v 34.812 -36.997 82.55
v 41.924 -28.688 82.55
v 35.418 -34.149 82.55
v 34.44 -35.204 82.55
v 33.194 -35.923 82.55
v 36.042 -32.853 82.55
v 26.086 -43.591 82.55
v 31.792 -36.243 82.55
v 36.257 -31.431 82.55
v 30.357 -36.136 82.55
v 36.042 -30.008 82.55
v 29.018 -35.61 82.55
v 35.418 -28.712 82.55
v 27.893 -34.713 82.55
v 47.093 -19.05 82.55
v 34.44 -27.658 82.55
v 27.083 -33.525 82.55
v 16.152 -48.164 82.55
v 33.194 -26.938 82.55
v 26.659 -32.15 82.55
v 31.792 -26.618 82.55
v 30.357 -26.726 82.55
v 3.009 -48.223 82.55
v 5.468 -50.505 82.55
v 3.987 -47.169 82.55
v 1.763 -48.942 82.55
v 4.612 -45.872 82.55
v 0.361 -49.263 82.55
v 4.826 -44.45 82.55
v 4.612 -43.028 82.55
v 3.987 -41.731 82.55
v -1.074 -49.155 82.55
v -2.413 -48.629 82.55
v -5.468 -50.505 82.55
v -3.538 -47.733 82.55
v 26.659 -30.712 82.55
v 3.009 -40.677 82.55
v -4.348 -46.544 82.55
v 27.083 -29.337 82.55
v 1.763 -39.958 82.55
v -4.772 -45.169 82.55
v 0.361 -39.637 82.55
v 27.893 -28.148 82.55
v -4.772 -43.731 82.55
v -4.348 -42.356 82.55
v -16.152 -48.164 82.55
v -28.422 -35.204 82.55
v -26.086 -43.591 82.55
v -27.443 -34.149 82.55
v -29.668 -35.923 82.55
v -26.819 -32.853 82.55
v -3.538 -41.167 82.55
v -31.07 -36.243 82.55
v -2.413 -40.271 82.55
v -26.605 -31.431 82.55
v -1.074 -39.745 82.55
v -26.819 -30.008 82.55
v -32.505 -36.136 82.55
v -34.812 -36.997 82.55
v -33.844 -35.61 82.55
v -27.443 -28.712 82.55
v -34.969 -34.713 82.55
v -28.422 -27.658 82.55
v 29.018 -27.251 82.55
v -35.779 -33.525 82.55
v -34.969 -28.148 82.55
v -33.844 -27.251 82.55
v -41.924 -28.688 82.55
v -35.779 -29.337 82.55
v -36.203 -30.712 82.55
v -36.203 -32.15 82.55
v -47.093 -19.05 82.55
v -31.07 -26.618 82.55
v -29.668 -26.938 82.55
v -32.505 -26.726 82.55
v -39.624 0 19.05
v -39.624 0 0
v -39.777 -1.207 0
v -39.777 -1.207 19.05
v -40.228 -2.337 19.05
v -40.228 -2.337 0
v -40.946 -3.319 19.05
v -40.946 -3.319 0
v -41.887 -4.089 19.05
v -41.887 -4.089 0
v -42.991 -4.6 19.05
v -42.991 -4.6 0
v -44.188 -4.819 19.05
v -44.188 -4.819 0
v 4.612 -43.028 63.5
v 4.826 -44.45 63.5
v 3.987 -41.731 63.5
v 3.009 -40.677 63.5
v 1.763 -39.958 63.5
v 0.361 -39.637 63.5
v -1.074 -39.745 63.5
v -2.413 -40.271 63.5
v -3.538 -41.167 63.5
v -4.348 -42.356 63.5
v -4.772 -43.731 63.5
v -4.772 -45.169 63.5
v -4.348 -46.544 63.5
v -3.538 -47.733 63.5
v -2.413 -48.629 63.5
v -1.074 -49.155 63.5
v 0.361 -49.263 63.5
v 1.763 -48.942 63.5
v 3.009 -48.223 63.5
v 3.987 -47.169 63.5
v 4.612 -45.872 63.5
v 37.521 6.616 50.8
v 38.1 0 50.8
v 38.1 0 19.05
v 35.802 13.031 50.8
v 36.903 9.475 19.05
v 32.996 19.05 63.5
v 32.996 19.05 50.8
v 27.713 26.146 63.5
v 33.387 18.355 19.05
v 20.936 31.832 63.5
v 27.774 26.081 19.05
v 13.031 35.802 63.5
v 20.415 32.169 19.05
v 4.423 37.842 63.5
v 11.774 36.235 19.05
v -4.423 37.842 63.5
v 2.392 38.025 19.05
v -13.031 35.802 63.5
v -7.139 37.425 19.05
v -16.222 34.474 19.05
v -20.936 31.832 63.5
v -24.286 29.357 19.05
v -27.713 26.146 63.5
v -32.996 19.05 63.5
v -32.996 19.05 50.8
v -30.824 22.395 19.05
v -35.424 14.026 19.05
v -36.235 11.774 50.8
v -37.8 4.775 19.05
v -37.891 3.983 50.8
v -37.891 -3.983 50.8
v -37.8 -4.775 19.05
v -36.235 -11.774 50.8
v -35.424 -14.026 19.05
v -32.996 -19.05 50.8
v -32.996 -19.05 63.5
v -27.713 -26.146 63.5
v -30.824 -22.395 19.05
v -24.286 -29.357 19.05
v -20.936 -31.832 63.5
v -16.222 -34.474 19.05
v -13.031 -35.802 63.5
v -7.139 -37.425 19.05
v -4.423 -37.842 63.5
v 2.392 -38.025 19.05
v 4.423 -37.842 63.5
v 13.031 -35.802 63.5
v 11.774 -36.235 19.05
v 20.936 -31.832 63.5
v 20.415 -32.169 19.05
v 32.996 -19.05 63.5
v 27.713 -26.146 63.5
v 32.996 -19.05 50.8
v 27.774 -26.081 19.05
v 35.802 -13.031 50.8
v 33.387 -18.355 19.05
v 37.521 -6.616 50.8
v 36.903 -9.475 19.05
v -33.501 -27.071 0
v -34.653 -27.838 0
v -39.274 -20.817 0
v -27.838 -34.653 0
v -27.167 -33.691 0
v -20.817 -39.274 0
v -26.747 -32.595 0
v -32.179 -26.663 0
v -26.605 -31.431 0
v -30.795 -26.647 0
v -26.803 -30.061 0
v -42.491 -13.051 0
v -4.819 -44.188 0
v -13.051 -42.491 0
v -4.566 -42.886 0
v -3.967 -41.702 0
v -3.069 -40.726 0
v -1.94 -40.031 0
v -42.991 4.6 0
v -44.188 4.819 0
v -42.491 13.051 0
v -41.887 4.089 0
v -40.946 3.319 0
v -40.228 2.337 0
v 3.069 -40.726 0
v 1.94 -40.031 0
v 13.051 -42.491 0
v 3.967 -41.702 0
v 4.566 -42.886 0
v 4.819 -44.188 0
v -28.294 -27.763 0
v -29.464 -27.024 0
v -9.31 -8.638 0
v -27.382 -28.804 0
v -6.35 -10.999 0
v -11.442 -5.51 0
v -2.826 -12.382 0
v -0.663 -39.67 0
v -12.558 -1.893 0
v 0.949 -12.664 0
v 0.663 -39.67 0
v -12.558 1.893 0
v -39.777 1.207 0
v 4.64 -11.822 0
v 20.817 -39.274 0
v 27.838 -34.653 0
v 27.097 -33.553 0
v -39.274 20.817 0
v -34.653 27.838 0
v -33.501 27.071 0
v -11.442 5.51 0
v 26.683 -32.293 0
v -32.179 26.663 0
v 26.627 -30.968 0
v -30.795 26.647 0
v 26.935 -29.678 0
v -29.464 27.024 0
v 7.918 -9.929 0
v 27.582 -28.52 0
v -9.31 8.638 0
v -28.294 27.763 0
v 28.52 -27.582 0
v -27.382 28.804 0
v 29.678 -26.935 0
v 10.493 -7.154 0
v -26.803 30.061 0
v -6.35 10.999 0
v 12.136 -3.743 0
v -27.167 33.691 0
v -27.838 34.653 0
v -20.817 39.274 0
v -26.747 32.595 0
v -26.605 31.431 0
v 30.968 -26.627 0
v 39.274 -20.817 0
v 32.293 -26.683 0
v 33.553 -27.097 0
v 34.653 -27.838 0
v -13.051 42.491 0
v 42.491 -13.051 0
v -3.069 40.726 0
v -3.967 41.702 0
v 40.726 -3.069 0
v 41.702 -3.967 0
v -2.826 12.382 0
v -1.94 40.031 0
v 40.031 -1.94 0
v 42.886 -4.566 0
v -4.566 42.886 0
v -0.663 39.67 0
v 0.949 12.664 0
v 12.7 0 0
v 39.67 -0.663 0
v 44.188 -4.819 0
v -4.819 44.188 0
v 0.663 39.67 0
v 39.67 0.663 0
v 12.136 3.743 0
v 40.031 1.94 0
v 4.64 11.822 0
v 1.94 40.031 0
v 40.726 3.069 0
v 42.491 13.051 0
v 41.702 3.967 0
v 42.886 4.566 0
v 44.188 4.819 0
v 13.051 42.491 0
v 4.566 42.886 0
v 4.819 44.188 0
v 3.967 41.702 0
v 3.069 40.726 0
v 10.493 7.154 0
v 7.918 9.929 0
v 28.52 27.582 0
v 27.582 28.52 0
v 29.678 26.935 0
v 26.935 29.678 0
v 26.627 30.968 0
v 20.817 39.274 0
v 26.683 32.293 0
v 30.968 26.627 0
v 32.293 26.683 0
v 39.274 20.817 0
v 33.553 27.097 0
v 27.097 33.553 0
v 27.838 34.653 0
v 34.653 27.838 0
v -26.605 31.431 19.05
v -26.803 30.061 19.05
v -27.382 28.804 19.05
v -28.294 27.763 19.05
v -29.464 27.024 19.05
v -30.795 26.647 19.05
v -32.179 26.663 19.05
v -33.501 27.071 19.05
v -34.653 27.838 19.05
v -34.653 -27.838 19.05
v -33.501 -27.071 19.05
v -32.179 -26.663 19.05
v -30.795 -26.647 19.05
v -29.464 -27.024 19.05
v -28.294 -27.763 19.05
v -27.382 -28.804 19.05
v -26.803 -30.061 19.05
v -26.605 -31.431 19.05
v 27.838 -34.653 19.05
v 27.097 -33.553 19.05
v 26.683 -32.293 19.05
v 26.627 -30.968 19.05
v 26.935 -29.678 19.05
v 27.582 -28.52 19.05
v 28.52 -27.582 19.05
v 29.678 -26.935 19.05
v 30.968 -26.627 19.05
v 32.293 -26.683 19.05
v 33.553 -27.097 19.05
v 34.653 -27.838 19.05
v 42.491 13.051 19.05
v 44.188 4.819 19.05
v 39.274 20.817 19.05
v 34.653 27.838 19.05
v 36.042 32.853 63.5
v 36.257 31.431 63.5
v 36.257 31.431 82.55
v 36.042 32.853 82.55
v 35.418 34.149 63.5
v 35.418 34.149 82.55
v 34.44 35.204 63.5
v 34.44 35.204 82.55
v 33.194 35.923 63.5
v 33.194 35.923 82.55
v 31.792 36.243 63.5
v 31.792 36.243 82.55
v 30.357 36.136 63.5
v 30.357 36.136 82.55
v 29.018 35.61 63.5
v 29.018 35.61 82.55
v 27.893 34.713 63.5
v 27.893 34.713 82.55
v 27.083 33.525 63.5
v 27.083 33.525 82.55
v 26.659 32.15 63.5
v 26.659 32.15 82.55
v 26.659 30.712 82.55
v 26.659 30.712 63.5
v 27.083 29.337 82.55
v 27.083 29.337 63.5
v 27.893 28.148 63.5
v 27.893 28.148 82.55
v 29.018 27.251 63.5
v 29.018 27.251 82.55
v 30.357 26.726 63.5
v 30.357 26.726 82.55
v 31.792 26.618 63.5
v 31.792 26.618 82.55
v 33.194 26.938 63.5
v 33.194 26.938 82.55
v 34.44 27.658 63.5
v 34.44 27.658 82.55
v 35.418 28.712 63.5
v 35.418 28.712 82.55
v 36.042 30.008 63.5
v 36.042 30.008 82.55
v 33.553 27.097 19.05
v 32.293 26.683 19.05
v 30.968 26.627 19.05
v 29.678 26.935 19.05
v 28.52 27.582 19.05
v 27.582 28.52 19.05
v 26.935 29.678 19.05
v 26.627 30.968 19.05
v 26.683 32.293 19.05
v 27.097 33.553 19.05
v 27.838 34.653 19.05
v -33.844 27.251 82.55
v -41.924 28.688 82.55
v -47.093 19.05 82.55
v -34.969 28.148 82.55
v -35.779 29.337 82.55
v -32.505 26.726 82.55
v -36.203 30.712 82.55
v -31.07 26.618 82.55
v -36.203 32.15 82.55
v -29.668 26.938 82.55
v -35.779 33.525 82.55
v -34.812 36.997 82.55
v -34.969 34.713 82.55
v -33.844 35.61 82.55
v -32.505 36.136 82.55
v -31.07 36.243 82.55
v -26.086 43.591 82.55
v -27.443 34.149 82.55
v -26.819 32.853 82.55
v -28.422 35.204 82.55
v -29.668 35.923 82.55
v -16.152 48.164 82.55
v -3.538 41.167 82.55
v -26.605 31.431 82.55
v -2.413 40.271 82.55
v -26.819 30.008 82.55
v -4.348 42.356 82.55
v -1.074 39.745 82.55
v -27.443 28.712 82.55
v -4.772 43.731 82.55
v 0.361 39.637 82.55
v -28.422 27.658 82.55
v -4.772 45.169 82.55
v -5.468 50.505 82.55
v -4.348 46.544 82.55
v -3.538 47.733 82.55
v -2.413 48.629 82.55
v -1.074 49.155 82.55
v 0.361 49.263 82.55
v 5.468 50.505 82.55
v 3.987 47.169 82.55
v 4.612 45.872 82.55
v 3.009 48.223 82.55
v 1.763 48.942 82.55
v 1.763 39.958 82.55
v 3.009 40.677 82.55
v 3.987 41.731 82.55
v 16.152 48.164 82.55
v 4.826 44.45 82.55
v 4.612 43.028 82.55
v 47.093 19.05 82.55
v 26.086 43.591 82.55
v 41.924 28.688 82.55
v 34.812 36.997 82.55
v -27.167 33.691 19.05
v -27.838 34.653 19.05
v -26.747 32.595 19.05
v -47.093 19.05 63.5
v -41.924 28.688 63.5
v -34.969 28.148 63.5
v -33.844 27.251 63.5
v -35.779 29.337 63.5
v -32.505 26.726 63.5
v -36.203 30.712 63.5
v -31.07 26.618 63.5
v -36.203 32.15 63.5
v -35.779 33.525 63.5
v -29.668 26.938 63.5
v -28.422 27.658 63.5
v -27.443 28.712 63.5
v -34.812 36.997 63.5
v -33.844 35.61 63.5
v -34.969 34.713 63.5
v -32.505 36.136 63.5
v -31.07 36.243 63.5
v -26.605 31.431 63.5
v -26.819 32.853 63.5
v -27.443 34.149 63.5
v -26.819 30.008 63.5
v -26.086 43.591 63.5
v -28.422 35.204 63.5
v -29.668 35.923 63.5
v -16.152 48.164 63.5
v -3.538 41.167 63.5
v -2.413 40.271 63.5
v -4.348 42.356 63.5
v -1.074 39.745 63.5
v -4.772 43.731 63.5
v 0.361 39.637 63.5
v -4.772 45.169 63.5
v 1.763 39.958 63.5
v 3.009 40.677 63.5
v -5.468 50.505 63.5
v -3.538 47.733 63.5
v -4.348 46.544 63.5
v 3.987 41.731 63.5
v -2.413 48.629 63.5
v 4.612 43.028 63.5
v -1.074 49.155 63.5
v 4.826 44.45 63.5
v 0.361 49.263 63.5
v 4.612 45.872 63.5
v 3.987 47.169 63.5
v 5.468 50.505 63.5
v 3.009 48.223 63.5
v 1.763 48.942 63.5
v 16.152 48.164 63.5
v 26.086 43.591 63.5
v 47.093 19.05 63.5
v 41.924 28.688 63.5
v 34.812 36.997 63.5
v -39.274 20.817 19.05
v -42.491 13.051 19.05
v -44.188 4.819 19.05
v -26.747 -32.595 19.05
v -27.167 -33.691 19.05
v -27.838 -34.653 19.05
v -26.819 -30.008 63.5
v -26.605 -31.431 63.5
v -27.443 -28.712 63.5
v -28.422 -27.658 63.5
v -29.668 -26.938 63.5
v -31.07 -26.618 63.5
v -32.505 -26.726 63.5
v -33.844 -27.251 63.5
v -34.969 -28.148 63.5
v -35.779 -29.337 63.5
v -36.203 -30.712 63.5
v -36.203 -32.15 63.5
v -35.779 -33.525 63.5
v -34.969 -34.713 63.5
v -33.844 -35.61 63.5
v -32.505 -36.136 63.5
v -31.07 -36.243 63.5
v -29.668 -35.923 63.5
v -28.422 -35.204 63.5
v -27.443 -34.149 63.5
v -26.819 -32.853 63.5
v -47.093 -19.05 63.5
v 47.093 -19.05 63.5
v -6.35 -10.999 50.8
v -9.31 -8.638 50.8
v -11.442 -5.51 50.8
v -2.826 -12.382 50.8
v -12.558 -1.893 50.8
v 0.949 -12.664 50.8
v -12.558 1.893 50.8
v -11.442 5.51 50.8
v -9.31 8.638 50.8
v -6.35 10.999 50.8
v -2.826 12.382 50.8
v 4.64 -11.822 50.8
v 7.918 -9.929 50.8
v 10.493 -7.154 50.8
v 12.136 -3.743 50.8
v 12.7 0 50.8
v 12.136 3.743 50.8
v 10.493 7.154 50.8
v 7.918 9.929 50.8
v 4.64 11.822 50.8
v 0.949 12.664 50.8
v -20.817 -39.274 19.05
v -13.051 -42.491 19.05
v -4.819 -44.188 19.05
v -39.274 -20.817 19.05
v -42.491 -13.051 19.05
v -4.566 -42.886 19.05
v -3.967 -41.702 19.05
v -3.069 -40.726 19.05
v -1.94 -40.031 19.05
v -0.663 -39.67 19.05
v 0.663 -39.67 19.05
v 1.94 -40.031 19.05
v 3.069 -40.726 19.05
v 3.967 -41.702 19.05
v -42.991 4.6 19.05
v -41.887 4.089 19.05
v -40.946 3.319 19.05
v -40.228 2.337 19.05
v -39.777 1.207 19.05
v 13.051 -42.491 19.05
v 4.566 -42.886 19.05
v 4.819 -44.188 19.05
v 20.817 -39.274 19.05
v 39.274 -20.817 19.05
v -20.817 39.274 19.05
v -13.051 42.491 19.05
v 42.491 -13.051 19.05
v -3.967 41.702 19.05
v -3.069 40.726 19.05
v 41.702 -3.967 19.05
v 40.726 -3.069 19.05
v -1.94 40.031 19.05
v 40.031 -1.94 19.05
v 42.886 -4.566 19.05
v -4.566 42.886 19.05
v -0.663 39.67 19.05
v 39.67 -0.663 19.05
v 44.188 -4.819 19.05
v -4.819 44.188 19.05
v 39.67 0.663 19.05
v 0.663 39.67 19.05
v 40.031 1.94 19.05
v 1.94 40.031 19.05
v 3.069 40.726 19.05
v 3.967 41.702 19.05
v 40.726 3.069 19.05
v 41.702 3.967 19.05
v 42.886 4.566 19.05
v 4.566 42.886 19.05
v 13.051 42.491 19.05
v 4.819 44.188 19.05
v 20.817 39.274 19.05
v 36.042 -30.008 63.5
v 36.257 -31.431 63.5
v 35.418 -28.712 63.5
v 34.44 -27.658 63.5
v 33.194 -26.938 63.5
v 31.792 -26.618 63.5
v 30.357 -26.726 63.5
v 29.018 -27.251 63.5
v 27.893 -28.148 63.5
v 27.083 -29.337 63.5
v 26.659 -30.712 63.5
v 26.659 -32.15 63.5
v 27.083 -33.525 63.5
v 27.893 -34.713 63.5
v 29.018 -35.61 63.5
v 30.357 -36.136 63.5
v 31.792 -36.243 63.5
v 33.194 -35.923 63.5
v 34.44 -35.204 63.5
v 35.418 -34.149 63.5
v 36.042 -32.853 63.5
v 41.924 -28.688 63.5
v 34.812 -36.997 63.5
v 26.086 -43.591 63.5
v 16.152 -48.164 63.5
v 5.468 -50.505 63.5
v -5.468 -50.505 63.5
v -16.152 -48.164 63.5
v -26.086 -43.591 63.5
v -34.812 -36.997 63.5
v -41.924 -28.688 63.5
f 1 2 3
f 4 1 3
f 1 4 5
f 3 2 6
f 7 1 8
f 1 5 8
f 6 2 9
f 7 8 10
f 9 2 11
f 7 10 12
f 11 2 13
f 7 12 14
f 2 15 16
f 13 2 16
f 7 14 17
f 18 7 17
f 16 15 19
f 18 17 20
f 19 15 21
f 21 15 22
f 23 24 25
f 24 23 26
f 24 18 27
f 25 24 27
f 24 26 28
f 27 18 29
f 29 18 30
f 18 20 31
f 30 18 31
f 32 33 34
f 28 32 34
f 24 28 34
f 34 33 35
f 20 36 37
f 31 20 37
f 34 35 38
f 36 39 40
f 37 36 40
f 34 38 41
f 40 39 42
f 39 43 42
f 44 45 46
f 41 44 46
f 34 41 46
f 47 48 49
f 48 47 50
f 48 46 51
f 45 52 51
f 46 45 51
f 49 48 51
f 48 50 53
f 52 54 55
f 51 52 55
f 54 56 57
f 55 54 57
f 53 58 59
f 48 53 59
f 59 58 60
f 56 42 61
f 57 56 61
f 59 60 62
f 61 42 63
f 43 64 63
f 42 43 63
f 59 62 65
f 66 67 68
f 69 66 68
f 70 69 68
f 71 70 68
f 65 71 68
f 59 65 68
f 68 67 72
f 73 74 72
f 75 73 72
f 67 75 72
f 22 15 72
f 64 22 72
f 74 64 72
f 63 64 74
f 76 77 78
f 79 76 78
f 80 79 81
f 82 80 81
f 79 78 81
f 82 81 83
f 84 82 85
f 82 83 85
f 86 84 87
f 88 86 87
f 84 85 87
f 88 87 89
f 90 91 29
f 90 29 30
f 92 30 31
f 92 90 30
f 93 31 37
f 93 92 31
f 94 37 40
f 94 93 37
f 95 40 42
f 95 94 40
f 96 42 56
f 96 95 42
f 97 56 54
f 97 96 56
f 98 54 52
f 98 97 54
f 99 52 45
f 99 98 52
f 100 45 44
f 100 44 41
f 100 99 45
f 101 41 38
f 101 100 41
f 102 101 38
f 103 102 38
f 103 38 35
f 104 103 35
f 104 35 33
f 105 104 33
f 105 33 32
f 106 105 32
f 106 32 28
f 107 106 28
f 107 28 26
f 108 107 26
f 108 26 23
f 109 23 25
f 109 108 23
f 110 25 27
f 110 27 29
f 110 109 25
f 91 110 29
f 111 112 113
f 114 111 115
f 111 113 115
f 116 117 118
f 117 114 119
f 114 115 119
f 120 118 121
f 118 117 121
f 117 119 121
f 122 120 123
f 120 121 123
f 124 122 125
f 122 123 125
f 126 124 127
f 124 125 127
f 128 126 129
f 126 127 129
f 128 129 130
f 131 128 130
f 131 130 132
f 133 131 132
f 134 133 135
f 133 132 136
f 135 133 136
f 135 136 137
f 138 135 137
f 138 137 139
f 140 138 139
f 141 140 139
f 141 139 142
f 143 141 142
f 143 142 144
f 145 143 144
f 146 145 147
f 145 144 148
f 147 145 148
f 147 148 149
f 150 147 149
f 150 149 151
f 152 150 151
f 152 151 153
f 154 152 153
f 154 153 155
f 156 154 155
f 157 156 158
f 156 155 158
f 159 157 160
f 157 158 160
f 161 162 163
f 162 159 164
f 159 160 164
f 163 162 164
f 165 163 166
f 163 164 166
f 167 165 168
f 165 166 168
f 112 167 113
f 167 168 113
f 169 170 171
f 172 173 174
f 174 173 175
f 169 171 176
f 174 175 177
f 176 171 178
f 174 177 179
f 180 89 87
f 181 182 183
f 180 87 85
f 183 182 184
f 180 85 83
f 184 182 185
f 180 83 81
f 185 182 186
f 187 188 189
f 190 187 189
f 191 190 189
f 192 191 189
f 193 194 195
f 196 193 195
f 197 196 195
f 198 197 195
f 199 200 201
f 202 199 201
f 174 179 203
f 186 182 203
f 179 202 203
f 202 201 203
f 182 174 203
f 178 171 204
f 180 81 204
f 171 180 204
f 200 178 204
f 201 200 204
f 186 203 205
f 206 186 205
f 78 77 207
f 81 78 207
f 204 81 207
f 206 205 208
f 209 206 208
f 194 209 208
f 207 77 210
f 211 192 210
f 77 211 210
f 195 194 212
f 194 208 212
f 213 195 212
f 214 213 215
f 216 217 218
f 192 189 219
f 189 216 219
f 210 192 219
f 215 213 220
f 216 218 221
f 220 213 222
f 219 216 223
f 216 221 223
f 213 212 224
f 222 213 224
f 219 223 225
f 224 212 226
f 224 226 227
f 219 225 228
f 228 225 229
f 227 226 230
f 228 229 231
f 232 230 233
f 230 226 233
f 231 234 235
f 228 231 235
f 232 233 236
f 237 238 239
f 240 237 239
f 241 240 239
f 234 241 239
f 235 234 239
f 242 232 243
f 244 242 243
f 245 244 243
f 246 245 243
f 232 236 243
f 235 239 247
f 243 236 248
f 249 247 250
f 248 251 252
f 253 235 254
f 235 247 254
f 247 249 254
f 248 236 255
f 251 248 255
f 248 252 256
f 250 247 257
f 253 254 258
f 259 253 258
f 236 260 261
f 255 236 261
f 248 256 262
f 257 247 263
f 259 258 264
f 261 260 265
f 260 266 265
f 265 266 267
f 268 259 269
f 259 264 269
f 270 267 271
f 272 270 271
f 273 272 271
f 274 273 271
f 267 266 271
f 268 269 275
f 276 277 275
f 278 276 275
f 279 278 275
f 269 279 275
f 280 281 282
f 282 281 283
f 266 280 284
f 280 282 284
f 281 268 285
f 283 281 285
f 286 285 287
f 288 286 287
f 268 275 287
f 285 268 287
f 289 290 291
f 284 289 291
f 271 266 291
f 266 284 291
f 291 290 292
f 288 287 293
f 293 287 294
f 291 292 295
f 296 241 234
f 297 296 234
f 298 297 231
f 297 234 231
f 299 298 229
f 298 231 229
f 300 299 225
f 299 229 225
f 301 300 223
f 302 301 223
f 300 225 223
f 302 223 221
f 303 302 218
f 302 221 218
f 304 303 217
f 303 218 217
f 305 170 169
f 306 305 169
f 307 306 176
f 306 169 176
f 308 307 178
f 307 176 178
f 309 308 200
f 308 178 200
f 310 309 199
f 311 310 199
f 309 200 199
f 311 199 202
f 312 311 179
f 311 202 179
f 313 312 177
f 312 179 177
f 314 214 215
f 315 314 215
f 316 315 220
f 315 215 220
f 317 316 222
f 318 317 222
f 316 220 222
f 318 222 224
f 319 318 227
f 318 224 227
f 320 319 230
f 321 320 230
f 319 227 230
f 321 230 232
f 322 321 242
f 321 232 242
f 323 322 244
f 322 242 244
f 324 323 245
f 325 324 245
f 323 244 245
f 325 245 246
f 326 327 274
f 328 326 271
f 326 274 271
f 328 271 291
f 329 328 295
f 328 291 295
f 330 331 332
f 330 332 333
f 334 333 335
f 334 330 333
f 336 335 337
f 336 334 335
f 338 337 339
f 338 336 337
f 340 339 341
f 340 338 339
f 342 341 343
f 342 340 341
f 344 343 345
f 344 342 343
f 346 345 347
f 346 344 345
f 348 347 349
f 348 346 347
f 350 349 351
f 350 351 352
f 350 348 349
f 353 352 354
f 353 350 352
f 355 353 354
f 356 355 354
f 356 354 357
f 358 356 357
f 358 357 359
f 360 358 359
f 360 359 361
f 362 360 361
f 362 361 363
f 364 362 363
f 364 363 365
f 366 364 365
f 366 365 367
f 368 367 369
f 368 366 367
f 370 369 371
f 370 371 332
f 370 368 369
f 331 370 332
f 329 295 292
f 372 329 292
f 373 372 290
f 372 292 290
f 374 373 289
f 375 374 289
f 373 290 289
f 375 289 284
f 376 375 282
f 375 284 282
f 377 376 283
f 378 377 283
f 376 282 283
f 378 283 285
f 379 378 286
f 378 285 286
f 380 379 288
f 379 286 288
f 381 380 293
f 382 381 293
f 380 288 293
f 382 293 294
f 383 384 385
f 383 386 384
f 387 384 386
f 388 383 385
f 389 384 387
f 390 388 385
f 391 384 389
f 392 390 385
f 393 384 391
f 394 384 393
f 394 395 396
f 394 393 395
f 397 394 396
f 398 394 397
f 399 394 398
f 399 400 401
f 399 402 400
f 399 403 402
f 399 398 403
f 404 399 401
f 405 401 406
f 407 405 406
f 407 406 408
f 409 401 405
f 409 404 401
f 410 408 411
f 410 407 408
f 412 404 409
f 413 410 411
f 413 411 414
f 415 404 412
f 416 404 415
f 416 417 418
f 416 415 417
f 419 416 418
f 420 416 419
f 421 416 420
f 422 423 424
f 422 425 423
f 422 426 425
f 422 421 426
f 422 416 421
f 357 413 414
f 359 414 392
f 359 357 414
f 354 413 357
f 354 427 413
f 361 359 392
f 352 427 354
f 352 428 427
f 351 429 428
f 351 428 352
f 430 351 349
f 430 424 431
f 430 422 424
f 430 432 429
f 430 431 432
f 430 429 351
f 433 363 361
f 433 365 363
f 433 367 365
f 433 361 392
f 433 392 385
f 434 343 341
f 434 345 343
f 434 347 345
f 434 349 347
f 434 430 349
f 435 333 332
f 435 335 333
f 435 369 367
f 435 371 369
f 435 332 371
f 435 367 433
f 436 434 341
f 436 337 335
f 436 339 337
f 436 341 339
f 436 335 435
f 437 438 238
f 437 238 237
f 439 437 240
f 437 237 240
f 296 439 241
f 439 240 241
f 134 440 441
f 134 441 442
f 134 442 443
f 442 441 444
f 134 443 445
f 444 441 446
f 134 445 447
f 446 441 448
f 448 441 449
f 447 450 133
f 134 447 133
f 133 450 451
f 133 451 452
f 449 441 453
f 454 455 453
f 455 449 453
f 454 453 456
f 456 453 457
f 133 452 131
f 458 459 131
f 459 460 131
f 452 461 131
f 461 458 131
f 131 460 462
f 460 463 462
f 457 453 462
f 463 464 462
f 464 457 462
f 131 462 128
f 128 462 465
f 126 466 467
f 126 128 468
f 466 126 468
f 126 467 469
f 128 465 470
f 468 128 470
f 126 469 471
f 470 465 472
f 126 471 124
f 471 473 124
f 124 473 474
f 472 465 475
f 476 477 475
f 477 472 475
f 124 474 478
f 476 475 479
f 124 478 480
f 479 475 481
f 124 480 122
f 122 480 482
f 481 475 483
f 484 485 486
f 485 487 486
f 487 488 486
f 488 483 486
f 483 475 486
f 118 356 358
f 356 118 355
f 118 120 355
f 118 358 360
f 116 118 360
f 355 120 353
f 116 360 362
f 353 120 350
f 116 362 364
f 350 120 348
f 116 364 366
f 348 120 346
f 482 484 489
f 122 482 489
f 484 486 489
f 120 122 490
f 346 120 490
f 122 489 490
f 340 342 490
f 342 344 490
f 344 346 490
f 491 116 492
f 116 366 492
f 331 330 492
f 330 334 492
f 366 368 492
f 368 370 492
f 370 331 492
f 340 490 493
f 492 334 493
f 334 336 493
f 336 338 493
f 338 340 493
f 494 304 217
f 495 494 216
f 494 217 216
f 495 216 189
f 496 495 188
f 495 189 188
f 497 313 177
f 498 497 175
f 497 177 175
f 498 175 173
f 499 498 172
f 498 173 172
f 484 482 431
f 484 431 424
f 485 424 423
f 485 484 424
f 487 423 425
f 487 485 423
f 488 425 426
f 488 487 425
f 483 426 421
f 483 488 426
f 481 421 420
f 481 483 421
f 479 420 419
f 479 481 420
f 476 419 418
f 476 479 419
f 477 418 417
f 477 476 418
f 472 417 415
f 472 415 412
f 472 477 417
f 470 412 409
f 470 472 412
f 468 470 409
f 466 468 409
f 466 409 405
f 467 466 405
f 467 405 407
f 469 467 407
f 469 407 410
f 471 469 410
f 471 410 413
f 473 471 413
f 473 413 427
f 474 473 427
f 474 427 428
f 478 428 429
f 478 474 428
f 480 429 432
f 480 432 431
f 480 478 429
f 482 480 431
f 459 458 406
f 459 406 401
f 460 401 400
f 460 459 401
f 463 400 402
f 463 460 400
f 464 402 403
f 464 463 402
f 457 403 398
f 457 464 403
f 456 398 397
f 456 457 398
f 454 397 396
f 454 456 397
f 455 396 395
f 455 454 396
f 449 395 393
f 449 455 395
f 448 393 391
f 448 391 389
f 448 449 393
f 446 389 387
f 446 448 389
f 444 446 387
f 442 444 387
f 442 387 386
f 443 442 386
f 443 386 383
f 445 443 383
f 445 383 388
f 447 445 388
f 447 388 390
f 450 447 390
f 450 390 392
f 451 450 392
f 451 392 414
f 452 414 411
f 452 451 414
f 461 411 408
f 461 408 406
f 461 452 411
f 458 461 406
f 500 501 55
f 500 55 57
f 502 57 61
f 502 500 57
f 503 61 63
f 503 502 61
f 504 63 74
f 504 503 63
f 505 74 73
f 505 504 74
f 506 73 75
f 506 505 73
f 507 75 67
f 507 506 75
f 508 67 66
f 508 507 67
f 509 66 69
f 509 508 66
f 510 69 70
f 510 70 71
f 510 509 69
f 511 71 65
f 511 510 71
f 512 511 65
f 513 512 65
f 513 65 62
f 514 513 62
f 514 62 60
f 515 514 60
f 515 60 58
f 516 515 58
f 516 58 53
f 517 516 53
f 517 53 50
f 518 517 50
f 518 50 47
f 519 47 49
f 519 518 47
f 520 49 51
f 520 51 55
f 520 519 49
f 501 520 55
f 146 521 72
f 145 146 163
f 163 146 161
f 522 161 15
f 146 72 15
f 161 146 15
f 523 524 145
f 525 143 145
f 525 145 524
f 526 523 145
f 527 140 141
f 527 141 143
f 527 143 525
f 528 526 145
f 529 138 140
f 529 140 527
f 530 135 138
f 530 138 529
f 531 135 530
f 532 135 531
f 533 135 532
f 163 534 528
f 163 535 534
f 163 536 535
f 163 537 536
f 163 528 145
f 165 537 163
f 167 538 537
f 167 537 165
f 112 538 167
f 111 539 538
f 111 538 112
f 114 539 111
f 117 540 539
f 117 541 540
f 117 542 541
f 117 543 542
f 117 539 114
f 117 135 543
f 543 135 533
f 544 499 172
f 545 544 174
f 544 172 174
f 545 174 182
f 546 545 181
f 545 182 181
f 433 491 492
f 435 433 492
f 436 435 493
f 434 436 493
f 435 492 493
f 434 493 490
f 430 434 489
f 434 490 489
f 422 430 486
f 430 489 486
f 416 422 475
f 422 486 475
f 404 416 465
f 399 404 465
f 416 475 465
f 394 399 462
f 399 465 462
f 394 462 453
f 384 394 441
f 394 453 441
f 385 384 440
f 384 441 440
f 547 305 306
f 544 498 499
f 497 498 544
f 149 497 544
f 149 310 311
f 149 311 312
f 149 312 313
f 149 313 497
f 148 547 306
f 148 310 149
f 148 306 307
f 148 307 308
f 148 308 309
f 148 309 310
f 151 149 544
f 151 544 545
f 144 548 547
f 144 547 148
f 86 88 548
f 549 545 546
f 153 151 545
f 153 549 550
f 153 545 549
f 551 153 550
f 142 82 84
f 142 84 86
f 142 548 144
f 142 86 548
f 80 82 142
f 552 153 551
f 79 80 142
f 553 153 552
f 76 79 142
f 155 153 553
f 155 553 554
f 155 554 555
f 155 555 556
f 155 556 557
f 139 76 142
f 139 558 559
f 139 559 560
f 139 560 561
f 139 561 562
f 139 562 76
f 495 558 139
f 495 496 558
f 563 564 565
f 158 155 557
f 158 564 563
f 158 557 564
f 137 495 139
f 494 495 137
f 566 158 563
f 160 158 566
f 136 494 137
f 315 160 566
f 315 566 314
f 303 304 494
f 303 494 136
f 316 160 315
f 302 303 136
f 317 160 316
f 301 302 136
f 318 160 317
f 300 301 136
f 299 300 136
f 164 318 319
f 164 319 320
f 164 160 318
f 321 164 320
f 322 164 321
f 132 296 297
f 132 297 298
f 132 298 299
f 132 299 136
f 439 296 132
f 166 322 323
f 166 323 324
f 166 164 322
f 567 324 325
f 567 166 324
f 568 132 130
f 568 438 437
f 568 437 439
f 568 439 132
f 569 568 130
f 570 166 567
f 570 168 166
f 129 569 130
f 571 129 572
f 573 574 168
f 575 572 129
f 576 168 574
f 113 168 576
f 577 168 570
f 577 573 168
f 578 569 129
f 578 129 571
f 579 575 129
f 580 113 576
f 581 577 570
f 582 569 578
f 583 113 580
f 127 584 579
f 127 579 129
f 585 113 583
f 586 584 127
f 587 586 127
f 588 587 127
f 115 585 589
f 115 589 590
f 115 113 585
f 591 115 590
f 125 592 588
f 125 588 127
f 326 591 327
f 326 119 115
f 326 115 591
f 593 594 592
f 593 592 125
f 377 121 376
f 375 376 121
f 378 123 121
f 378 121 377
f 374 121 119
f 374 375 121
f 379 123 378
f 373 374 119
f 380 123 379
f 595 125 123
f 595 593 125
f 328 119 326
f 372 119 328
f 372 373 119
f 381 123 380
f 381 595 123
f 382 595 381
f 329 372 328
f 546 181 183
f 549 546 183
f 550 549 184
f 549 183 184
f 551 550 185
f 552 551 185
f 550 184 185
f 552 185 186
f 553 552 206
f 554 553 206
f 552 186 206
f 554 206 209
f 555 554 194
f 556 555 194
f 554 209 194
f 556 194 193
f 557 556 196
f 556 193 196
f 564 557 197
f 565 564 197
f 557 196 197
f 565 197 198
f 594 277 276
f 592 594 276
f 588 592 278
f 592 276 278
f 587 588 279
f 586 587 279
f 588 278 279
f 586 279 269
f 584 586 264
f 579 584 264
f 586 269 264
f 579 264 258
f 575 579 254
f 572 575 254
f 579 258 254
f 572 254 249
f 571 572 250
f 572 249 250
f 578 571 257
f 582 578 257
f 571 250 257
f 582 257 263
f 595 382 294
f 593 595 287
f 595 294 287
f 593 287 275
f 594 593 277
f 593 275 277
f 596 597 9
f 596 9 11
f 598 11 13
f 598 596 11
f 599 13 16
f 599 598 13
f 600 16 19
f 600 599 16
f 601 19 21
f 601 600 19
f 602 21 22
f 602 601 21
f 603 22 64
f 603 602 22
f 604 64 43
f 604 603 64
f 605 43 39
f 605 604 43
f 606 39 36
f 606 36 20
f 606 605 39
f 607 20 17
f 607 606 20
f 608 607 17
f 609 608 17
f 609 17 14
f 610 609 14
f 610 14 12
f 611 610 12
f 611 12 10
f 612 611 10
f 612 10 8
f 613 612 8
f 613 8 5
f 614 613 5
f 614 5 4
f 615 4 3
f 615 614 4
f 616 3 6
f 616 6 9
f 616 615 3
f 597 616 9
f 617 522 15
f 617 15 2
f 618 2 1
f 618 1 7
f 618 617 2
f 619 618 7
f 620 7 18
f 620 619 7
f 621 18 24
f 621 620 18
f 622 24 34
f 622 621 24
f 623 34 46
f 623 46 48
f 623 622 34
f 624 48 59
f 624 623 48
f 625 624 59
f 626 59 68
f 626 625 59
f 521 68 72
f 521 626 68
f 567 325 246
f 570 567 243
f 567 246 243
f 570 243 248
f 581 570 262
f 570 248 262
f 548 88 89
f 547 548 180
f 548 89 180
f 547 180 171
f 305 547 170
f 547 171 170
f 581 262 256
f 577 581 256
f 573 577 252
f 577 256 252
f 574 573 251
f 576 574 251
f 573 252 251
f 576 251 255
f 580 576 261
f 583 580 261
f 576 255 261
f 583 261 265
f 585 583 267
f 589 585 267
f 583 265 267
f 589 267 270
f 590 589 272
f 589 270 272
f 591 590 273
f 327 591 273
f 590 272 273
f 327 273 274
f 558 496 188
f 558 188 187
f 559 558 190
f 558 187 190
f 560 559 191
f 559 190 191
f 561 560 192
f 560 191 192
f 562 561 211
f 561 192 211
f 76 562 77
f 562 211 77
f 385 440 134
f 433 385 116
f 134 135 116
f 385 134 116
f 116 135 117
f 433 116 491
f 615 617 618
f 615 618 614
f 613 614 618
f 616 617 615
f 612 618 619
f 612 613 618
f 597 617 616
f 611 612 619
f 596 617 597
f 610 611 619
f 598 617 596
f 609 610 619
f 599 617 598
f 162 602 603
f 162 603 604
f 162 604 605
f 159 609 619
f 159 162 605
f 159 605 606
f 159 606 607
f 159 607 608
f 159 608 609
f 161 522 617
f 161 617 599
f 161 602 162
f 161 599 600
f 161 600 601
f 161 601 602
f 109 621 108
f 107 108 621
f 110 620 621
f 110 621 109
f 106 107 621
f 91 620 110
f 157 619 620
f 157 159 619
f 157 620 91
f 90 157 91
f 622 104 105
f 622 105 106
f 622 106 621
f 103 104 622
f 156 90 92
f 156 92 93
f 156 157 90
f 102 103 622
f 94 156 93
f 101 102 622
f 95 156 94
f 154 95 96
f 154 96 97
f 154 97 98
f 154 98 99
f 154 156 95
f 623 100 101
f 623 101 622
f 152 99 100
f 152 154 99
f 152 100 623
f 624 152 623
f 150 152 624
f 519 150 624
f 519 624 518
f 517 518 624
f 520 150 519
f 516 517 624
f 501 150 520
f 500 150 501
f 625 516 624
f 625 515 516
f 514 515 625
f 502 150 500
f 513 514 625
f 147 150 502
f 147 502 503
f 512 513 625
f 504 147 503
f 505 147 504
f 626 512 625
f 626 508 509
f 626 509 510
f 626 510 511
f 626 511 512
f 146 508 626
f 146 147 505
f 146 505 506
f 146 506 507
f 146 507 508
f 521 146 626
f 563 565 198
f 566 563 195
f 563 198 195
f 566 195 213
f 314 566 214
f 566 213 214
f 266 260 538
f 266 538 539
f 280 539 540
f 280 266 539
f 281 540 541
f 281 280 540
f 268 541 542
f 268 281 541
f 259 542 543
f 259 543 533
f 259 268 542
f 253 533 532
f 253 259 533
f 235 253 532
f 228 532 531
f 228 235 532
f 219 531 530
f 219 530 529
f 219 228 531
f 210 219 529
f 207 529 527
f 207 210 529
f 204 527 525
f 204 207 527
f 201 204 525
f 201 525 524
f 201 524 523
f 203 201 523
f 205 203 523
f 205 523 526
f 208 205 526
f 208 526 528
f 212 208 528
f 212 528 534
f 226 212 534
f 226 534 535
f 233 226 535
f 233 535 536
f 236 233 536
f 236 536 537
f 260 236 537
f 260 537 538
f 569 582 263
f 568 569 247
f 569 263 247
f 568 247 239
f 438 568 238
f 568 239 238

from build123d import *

# Parameters (mm, degrees)
SKETCH1_R           = 38.1
SKETCH1_R_2         = 12.7
BOSS_EXTRUDE1_DEPTH = 63.5
SKETCH1_3_R         = 38.1
BOSS_EXTRUDE2_DEPTH = 19.05
SKETCH2_R           = 4.826
BOSS_EXTRUDE3_DEPTH = 19.05
CUT_EXTRUDE1_START  = -12.7
SKETCH2_3_R         = 12.7
CUT_EXTRUDE1_DEPTH  = 12.7


with BuildPart() as part:
    # Sketch1 → Boss-Extrude1 (new body)
    with BuildSketch(Plane.XY):
        Circle(SKETCH1_R)
        Circle(SKETCH1_R_2, mode=Mode.SUBTRACT)
    extrude(amount=BOSS_EXTRUDE1_DEPTH)

    # Sketch1<3> → Boss-Extrude2 (add)
    with BuildSketch(Plane.XY):
        with BuildLine():
            ThreePointArc((44.188017143, -4.81888379), (39.624, 0), (44.188017143, 4.81888379))
            ThreePointArc((44.188017143, 4.81888379), (41.06644522, 17.010278569), (34.653111975, 27.838181163))
            ThreePointArc((34.653111975, 27.838181163), (28.018399098, 28.018399098), (27.838181163, 34.653111975))
            ThreePointArc((27.838181163, 34.653111975), (17.010278569, 41.06644522), (4.81888379, 44.188017143))
            ThreePointArc((4.81888379, 44.188017143), (0, 39.624), (-4.81888379, 44.188017143))
            ThreePointArc((-4.81888379, 44.188017143), (-17.010278569, 41.06644522), (-27.838181163, 34.653111975))
            ThreePointArc((-27.838181163, 34.653111975), (-26.923750994, 33.155980792), (-26.604896424, 31.430896424))
            ThreePointArc((-26.604896424, 31.430896424), (-29.463682181, 27.024044472), (-34.653111975, 27.838181163))
            ThreePointArc((-34.653111975, 27.838181163), (-41.06644522, 17.010278569), (-44.188017143, 4.81888379))
            ThreePointArc((-44.188017143, 4.81888379), (-40.946101795, 3.318580022), (-39.624, 0))
            ThreePointArc((-39.624, 0), (-40.946101795, -3.318580023), (-44.188017143, -4.81888379))
            ThreePointArc((-44.188017143, -4.81888379), (-41.06644522, -17.010278569), (-34.653111975, -27.838181163))
            ThreePointArc((-34.653111975, -27.838181163), (-29.463682181, -27.024044472), (-26.604896424, -31.430896424))
            ThreePointArc((-26.604896424, -31.430896424), (-26.923750994, -33.155980792), (-27.838181163, -34.653111975))
            ThreePointArc((-27.838181163, -34.653111975), (-17.010278569, -41.06644522), (-4.81888379, -44.188017143))
            ThreePointArc((-4.81888379, -44.188017143), (0, -39.624), (4.81888379, -44.188017143))
            ThreePointArc((4.81888379, -44.188017143), (17.010278569, -41.06644522), (27.838181163, -34.653111975))
            ThreePointArc((27.838181163, -34.653111975), (28.018399098, -28.018399098), (34.653111975, -27.838181163))
            ThreePointArc((34.653111975, -27.838181163), (41.06644522, -17.010278569), (44.188017143, -4.81888379))
        make_face()
        Circle(SKETCH1_3_R, mode=Mode.SUBTRACT)
    extrude(amount=BOSS_EXTRUDE2_DEPTH)

    # Sketch2 → Boss-Extrude3 (add)
    # profile 1 of 2: a face of its own
    with BuildSketch(Plane.XY.offset(63.5)):
        with BuildLine():
            ThreePointArc((47.092860393, 19.05), (0, 50.8), (-47.092860393, 19.05))
            Line((-47.092860393, 19.05), (47.092860393, 19.05))
        make_face()
        with Locations((-31.430896424, 31.430896424)):
            Circle(SKETCH2_R, mode=Mode.SUBTRACT)
        with Locations((0, 44.45)):
            Circle(SKETCH2_R, mode=Mode.SUBTRACT)
        with Locations((31.430896424, 31.430896424)):
            Circle(SKETCH2_R, mode=Mode.SUBTRACT)
    # profile 2 of 2: a face of its own
    with BuildSketch(Plane.XY.offset(63.5)):
        with BuildLine():
            Line((47.092860393, -19.05), (-47.092860393, -19.05))
            ThreePointArc((-47.092860393, -19.05), (0, -50.8), (47.092860393, -19.05))
        make_face()
        with Locations((-31.430896424, -31.430896424)):
            Circle(SKETCH2_R, mode=Mode.SUBTRACT)
        with Locations((0, -44.45)):
            Circle(SKETCH2_R, mode=Mode.SUBTRACT)
        with Locations((31.430896424, -31.430896424)):
            Circle(SKETCH2_R, mode=Mode.SUBTRACT)
    extrude(amount=BOSS_EXTRUDE3_DEPTH)

    # Sketch2<3> → Cut-Extrude1 (cut)
    with BuildSketch(Plane.XY.offset(63.5).offset(CUT_EXTRUDE1_START)):
        with BuildLine():
            Line((32.995567884, 19.05), (-32.995567884, 19.05))
            ThreePointArc((-32.995567884, 19.05), (-38.1, 0), (-32.995567884, -19.05))
            Line((-32.995567884, -19.05), (32.995567884, -19.05))
            ThreePointArc((32.995567884, -19.05), (38.1, 0), (32.995567884, 19.05))
        make_face()
        Circle(SKETCH2_3_R, mode=Mode.SUBTRACT)
    extrude(amount=CUT_EXTRUDE1_DEPTH, mode=Mode.SUBTRACT)


solid = part.part
